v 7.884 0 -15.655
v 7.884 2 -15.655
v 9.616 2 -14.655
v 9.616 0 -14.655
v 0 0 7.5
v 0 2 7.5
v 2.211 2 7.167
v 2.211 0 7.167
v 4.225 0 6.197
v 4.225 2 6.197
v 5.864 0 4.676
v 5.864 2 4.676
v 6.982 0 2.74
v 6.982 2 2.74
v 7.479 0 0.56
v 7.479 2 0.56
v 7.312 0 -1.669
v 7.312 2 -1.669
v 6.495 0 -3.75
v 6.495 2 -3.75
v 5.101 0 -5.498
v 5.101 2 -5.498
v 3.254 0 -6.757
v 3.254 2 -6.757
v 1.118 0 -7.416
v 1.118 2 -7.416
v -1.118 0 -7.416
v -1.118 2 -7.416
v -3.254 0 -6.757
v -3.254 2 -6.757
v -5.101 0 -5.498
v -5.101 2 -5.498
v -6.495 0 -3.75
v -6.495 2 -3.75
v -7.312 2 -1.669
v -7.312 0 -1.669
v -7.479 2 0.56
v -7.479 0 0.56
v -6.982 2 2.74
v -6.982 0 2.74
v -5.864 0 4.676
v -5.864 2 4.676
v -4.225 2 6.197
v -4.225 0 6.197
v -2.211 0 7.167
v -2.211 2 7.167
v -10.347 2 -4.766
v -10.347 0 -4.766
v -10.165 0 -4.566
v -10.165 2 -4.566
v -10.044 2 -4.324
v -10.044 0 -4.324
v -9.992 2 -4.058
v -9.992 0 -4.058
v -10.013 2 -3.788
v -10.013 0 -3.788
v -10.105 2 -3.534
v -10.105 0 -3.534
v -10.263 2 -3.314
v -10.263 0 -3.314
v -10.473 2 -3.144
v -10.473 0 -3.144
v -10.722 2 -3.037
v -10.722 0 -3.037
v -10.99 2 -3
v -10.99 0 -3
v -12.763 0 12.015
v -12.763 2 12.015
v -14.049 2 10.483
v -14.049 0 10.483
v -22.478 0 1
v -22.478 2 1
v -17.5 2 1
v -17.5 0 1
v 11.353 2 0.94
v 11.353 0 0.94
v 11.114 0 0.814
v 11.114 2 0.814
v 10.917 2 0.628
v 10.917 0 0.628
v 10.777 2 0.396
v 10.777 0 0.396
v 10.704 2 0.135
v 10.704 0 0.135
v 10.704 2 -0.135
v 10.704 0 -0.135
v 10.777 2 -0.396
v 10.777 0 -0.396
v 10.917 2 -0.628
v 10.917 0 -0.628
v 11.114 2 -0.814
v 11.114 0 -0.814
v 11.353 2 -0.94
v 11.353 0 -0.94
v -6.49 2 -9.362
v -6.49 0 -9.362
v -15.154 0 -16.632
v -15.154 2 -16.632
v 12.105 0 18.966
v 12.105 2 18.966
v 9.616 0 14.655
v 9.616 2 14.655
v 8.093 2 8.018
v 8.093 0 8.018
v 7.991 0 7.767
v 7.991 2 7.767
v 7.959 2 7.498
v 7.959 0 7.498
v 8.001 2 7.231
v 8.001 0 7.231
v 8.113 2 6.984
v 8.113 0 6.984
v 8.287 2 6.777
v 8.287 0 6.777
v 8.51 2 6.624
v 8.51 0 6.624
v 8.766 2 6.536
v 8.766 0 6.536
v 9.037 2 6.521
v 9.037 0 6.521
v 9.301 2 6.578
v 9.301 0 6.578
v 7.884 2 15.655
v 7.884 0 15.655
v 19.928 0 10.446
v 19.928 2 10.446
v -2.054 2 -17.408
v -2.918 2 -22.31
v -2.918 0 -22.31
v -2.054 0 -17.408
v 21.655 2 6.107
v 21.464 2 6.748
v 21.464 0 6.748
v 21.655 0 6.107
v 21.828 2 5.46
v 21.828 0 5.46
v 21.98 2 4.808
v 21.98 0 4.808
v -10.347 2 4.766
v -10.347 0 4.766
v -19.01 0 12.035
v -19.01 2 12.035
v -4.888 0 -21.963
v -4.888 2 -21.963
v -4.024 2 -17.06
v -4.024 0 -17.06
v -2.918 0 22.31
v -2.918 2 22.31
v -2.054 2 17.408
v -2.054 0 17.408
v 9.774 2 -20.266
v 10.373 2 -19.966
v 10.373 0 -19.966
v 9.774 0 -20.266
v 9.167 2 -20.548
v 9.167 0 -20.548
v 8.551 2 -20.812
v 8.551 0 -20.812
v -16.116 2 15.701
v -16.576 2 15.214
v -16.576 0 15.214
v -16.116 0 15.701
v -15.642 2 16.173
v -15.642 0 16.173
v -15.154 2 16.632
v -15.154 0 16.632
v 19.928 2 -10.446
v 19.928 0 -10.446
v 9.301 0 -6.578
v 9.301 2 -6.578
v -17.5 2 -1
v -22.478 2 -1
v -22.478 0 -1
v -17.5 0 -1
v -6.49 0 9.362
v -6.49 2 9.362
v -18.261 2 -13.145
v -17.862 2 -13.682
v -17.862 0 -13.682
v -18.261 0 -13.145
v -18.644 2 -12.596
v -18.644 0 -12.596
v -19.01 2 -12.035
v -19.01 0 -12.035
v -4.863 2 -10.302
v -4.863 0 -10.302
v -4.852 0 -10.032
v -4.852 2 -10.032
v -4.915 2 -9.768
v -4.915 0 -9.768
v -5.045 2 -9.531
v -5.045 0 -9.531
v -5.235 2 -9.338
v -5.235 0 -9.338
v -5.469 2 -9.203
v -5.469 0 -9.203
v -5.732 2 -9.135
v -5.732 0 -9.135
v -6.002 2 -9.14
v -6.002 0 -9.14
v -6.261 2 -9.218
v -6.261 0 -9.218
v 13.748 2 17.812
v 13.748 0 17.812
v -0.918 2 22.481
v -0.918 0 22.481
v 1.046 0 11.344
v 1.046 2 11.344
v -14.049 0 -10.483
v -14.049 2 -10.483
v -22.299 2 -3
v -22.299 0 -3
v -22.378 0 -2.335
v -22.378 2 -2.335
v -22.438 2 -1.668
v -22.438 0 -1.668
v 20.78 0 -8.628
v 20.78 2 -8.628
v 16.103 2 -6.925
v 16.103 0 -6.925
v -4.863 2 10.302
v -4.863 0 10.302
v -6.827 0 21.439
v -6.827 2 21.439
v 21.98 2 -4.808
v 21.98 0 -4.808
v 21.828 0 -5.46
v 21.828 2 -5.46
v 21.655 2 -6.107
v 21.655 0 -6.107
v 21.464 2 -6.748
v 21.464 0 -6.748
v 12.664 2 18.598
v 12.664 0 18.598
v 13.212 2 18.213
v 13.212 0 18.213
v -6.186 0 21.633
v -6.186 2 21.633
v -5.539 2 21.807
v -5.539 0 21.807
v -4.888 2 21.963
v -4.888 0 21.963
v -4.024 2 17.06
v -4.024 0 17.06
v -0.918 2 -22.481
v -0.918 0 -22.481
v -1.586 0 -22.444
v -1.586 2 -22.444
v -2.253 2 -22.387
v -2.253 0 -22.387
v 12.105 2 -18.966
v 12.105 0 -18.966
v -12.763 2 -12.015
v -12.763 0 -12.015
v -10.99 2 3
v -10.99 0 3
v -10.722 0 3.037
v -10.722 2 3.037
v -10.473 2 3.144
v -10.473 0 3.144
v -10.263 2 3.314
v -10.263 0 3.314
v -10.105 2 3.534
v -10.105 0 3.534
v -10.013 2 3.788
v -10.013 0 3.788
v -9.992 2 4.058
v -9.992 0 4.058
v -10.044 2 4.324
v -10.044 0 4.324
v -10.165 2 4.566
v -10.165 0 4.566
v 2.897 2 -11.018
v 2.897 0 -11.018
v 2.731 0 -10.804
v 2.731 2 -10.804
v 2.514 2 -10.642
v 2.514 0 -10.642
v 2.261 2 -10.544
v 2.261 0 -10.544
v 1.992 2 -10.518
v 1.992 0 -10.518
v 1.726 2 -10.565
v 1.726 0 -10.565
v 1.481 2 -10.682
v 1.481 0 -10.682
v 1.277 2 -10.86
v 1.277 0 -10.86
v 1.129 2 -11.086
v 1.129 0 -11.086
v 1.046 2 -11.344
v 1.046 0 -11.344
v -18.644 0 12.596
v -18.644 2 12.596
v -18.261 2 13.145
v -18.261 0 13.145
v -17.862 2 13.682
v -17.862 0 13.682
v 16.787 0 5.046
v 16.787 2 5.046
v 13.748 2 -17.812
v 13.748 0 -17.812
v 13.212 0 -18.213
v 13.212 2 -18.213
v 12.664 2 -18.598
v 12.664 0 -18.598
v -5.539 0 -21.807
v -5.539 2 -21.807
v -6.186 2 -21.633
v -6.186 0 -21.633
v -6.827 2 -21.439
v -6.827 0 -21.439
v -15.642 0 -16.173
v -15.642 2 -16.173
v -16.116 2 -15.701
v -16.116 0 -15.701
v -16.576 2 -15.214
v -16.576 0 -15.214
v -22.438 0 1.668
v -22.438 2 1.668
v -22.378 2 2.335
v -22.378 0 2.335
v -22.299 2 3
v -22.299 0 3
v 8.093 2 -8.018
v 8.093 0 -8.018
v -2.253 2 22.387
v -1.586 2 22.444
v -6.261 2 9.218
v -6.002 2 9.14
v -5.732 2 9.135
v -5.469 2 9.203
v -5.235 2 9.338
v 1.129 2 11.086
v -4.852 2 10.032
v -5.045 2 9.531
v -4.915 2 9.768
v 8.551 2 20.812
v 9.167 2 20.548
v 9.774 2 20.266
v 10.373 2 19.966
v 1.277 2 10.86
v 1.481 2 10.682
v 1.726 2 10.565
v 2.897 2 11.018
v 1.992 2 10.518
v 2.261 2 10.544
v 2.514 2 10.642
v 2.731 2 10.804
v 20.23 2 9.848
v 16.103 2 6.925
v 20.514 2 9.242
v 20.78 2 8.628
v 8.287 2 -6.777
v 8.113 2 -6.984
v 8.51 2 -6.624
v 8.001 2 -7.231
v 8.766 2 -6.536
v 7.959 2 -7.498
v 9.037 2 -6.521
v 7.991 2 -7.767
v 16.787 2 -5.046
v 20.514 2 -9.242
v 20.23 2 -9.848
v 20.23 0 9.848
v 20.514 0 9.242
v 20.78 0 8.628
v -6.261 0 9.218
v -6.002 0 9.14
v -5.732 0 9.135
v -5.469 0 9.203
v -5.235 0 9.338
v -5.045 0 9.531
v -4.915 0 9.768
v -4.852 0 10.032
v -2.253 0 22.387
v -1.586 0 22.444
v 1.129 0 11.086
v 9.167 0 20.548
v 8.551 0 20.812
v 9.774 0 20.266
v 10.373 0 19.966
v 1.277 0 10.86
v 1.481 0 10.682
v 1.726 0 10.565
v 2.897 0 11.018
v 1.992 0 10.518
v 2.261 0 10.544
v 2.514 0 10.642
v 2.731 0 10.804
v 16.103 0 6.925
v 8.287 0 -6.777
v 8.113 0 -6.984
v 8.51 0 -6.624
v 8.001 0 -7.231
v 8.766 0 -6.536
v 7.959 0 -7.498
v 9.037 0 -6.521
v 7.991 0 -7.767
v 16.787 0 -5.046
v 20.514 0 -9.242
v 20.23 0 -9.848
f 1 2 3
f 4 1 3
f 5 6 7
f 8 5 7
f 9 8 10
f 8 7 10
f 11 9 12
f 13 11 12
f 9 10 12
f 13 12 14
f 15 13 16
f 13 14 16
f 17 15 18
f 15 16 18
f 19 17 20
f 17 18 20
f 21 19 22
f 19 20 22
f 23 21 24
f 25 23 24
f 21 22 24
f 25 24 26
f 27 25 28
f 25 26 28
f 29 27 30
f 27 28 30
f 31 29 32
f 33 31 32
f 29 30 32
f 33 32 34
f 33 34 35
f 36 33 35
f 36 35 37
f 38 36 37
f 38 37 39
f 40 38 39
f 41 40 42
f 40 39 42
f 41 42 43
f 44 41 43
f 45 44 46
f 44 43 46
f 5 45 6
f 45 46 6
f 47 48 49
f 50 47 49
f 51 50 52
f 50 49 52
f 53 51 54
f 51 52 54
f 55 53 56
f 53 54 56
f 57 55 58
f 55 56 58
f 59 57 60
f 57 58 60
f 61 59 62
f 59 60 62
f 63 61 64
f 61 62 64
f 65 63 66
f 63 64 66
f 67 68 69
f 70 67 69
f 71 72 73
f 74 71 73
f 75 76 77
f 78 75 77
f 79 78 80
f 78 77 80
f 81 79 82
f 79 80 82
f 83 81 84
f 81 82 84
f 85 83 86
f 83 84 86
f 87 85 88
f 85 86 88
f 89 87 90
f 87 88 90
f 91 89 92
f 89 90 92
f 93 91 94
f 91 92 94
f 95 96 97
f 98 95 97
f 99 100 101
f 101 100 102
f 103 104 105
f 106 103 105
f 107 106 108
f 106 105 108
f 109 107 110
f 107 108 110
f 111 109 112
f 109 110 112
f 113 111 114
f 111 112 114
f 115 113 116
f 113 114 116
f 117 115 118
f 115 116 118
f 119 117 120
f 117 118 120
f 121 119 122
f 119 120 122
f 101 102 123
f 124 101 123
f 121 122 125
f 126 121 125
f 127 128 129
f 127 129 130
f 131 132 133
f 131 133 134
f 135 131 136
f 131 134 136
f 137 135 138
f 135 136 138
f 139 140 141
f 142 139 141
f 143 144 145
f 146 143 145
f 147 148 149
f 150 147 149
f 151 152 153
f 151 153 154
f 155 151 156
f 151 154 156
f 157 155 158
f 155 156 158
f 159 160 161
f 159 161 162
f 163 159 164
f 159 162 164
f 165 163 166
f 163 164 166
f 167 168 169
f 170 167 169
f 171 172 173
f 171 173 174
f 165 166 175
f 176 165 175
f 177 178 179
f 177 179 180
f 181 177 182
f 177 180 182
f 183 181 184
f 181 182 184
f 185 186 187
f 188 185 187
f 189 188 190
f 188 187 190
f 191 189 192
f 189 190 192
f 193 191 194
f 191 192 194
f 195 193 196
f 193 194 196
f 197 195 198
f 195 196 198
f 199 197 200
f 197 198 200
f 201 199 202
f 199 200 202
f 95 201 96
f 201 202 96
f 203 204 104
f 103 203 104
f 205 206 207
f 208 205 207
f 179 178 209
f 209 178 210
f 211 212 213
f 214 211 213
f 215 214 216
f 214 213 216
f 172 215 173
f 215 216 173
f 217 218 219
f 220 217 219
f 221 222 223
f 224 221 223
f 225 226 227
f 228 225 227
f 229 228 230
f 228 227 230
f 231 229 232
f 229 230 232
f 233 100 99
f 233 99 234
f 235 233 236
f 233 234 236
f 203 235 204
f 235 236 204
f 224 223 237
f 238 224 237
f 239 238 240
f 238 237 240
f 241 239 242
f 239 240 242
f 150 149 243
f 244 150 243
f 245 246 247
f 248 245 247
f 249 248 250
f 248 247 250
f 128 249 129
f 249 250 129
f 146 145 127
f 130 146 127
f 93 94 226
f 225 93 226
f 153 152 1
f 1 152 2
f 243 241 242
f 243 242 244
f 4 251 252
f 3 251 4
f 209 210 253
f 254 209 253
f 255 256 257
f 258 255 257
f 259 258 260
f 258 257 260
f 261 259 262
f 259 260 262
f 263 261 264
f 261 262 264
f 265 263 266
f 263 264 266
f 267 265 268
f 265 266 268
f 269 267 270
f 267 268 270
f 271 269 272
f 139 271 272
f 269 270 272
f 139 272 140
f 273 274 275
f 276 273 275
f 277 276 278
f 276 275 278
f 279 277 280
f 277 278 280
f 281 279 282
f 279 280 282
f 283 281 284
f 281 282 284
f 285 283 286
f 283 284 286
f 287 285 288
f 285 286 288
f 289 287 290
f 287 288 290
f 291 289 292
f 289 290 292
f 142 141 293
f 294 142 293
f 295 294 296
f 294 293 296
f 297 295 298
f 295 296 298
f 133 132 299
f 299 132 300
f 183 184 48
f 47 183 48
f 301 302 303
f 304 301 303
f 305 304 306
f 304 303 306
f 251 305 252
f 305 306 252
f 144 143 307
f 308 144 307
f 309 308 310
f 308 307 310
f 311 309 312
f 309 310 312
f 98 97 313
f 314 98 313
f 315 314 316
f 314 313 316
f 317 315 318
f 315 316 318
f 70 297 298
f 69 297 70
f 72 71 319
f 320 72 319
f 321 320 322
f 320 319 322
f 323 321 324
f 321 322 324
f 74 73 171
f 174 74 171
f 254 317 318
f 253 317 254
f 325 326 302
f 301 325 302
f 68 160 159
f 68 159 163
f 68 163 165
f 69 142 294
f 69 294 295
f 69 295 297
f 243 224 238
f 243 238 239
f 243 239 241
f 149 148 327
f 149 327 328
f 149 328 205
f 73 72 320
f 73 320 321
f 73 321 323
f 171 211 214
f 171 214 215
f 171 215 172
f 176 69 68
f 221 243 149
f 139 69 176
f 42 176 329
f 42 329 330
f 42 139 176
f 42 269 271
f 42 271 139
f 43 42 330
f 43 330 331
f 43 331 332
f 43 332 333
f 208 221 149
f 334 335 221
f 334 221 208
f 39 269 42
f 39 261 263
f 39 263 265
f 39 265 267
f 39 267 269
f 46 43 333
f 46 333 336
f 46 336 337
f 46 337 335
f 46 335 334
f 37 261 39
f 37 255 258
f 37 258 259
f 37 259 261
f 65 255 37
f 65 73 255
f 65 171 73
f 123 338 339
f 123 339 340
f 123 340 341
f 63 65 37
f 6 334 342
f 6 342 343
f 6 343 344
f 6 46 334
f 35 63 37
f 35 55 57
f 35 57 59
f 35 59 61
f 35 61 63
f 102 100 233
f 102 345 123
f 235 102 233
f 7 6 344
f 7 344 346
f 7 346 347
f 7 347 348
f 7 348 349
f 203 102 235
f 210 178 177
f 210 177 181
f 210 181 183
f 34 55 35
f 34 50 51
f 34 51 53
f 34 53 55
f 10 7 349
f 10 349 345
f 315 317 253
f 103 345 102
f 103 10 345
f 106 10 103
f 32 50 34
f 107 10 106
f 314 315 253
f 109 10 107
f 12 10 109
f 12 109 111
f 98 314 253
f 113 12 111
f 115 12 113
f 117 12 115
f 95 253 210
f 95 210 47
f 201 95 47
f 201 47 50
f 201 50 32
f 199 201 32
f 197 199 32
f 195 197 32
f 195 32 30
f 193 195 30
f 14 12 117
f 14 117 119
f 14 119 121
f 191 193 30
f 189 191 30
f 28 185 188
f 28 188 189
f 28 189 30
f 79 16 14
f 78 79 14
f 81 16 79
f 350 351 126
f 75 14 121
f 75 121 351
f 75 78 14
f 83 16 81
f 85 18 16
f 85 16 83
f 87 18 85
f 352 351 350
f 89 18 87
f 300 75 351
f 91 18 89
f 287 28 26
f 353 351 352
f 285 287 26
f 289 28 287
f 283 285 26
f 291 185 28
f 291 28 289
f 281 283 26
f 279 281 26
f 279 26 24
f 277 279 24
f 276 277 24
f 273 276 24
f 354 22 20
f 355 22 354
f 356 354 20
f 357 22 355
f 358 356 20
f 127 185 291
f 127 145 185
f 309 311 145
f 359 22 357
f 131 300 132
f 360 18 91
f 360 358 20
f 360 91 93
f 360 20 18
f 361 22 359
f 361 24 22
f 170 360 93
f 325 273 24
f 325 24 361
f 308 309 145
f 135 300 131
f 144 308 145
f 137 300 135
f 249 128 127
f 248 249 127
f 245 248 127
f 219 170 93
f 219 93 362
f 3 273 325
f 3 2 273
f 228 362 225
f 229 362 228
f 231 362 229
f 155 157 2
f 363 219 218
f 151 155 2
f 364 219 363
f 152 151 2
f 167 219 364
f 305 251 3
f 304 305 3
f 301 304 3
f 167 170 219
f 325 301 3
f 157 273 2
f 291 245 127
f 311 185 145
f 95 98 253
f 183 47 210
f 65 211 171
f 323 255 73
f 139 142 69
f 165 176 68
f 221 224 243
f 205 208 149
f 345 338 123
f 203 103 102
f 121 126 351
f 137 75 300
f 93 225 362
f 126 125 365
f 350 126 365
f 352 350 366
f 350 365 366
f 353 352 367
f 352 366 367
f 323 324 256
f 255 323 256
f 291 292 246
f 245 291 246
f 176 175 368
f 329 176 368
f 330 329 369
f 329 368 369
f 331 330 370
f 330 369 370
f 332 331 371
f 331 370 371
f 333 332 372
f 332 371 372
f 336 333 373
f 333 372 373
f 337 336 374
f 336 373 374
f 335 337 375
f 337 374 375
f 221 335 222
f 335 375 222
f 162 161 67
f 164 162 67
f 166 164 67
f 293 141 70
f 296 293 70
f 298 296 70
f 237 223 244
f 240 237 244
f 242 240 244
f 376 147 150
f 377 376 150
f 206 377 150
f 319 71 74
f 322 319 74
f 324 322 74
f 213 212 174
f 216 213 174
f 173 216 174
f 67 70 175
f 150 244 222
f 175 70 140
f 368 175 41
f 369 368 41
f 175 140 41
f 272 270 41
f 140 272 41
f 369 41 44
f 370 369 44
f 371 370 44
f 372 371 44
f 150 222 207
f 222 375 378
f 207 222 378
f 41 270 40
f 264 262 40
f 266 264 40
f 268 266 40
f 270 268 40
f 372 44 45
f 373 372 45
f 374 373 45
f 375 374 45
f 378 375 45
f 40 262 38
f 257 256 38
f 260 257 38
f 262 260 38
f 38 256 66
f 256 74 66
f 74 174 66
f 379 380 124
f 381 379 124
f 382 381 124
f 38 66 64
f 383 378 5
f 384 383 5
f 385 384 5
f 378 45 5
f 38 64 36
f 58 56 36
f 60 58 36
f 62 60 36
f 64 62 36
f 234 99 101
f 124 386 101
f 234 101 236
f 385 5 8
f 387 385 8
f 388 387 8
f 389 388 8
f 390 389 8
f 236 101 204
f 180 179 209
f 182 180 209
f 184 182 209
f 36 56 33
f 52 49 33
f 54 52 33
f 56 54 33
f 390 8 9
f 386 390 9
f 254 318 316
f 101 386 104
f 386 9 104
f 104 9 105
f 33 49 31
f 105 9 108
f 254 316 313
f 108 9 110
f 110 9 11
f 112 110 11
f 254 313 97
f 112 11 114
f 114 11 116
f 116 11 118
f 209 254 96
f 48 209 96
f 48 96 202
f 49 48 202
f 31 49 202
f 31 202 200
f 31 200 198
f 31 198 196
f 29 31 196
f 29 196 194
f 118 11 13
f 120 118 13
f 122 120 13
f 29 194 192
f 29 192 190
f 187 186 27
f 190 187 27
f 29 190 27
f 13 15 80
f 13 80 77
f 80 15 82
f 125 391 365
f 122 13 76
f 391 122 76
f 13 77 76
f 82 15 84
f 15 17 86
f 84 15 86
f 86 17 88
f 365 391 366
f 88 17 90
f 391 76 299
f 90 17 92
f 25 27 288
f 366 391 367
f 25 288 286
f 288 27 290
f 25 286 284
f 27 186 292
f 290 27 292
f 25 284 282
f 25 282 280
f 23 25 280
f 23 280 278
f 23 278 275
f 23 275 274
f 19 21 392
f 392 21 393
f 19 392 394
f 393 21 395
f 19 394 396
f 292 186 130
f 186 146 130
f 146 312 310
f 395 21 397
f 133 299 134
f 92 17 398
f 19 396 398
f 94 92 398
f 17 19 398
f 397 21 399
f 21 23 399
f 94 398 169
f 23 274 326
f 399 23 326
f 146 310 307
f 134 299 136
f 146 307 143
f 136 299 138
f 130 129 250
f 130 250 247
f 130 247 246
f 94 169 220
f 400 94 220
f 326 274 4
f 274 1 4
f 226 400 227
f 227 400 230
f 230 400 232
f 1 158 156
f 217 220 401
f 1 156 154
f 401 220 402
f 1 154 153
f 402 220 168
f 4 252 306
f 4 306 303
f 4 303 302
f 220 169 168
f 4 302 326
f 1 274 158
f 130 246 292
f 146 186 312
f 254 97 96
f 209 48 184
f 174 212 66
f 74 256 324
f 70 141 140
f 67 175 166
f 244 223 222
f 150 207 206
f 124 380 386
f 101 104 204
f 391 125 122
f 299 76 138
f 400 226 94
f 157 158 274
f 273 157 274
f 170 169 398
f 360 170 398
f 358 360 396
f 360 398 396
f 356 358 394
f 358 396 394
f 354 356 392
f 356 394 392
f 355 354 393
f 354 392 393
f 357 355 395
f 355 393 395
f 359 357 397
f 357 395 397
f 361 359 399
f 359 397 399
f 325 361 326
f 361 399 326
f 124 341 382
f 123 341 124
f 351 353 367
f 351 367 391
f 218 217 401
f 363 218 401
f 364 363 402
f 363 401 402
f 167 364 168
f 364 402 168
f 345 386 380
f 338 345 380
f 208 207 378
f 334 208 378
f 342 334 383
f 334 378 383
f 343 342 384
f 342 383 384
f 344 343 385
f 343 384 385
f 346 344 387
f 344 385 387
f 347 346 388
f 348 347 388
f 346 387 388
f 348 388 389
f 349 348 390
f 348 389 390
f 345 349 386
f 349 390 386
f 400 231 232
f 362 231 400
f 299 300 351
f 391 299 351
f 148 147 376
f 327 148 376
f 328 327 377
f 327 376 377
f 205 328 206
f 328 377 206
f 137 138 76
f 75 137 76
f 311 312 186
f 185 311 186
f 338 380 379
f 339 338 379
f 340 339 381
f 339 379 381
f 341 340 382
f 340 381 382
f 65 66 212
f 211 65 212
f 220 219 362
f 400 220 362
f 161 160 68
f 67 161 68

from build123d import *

# Parameters (mm, degrees)
BOSS_EXTRUDE3_DEPTH = 2
SKETCH6_W           = 10
SKETCH6_H           = 2
CUT_EXTRUDE4_DEPTH  = 2
CIRPATTERN3_COUNT   = 9
SKETCH7_R           = 7.5
CUT_EXTRUDE5_DEPTH  = 2


with BuildPart() as part:
    # Sketch1 → Boss-Extrude3 (new body)
    with BuildSketch(Plane(origin=(0, 0, 0), x_dir=(1, 0, 0), z_dir=(0, 1, 0))):
        with BuildLine():
            Line((-6.82662188, 21.439385106), (-4.862801047, 10.302003723))
            ThreePointArc((-4.862801047, 10.302003723), (-5.3476088, 9.262330141), (-6.49039641, 9.362311102))
            Line((-6.49039641, 9.362311102), (-15.153741203, 16.631720523))
            ThreePointArc((-15.153741203, 16.631720523), (-16.231142068, 15.582041817), (-17.23599997, 14.462721218))
            Line((-17.23599997, 14.462721218), (0, 0))
            Line((0, 0), (-22.5, 0))
            ThreePointArc((-22.5, 0), (-22.4497196, -1.503359534), (-22.299103121, -3))
            Line((-22.299103121, -3), (-10.989909678, -3))
            ThreePointArc((-10.989909678, -3), (-10.050217057, -3.657979857), (-10.347122068, -4.766044443))
            Line((-10.347122068, -4.766044443), (-19.010466861, -12.035453864))
            ThreePointArc((-19.010466861, -12.035453864), (-17.23599997, -14.462721218), (-15.153741203, -16.631720523))
            Line((-15.153741203, -16.631720523), (-6.49039641, -9.362311102))
            ThreePointArc((-6.49039641, -9.362311102), (-5.3476088, -9.262330141), (-4.862801047, -10.302003723))
            Line((-4.862801047, -10.302003723), (-6.82662188, -21.439385106))
            ThreePointArc((-6.82662188, -21.439385106), (-3.907083998, -22.158174443), (-0.917775362, -22.481274172))
            Line((-0.917775362, -22.481274172), (1.046045471, -11.343892789))
            ThreePointArc((1.046045471, -11.343892789), (1.857205046, -10.532733213), (2.896878628, -11.017540966))
            Line((2.896878628, -11.017540966), (8.551475349, -20.811589784))
            ThreePointArc((8.551475349, -20.811589784), (11.25, -19.485571585), (13.747627772, -17.811589784))
            Line((13.747627772, -17.811589784), (8.09303105, -8.017540966))
            ThreePointArc((8.09303105, -8.017540966), (8.193012011, -6.874753357), (9.301076597, -6.577848346))
            Line((9.301076597, -6.577848346), (19.928242223, -10.445820308))
            ThreePointArc((19.928242223, -10.445820308), (21.143083968, -7.695453225), (21.980363083, -4.807664583))
            Line((21.980363083, -4.807664583), (11.353197457, -0.939692621))
            ThreePointArc((11.353197457, -0.939692621), (10.695217601, 0), (11.353197457, 0.939692621))
            Line((11.353197457, 0.939692621), (21.980363083, 4.807664583))
            ThreePointArc((21.980363083, 4.807664583), (21.143083968, 7.695453225), (19.928242223, 10.445820308))
            Line((19.928242223, 10.445820308), (9.301076597, 6.577848346))
            ThreePointArc((9.301076597, 6.577848346), (8.193012011, 6.874753357), (8.09303105, 8.017540966))
            Line((8.09303105, 8.017540966), (13.747627772, 17.811589784))
            ThreePointArc((13.747627772, 17.811589784), (11.25, 19.485571585), (8.551475349, 20.811589784))
            Line((8.551475349, 20.811589784), (2.896878628, 11.017540966))
            ThreePointArc((2.896878628, 11.017540966), (1.857205046, 10.532733213), (1.046045471, 11.343892789))
            Line((1.046045471, 11.343892789), (-0.917775362, 22.481274172))
            ThreePointArc((-0.917775362, 22.481274172), (-3.907083998, 22.158174443), (-6.82662188, 21.439385106))
        make_face()
        with BuildLine():
            Line((0, 0), (-17.23599997, 14.462721218))
            ThreePointArc((-17.23599997, 14.462721218), (-18.163823831, 13.278761383), (-19.010466861, 12.035453864))
            Line((-19.010466861, 12.035453864), (-10.347122068, 4.766044443))
            ThreePointArc((-10.347122068, 4.766044443), (-10.050217057, 3.657979857), (-10.989909678, 3))
            Line((-10.989909678, 3), (-22.299103121, 3))
            ThreePointArc((-22.299103121, 3), (-22.4497196, 1.503359534), (-22.5, 0))
            Line((-22.5, 0), (0, 0))
        make_face()
    extrude(amount=BOSS_EXTRUDE3_DEPTH)

    # Sketch6 → Cut-Extrude4 (cut)
    with BuildSketch(Plane(origin=(0, 2, 0), x_dir=(1, 0, 0), z_dir=(0, 1, 0))):
        with Locations((-22.5, 0)):
            Rectangle(SKETCH6_W, SKETCH6_H)
    cut_extrude4 = extrude(amount=-CUT_EXTRUDE4_DEPTH, mode=Mode.SUBTRACT)

    # CirPattern3: Cut-Extrude4 ×9 about axis
    cirpattern3_axis = Axis((0, 0, 0), (0, 1, 0))
    for i in range(1, CIRPATTERN3_COUNT):
        add(cut_extrude4.rotate(cirpattern3_axis, i * 360 / CIRPATTERN3_COUNT), mode=Mode.SUBTRACT)

    # Sketch7 → Cut-Extrude5 (cut)
    with BuildSketch(Plane(origin=(0, 2, 0), x_dir=(1, 0, 0), z_dir=(0, 1, 0))):
        with Locations(Location((0, 0, 0), (0, 0, 270))):
            Circle(SKETCH7_R)
    extrude(amount=-CUT_EXTRUDE5_DEPTH, mode=Mode.SUBTRACT)


solid = part.part
